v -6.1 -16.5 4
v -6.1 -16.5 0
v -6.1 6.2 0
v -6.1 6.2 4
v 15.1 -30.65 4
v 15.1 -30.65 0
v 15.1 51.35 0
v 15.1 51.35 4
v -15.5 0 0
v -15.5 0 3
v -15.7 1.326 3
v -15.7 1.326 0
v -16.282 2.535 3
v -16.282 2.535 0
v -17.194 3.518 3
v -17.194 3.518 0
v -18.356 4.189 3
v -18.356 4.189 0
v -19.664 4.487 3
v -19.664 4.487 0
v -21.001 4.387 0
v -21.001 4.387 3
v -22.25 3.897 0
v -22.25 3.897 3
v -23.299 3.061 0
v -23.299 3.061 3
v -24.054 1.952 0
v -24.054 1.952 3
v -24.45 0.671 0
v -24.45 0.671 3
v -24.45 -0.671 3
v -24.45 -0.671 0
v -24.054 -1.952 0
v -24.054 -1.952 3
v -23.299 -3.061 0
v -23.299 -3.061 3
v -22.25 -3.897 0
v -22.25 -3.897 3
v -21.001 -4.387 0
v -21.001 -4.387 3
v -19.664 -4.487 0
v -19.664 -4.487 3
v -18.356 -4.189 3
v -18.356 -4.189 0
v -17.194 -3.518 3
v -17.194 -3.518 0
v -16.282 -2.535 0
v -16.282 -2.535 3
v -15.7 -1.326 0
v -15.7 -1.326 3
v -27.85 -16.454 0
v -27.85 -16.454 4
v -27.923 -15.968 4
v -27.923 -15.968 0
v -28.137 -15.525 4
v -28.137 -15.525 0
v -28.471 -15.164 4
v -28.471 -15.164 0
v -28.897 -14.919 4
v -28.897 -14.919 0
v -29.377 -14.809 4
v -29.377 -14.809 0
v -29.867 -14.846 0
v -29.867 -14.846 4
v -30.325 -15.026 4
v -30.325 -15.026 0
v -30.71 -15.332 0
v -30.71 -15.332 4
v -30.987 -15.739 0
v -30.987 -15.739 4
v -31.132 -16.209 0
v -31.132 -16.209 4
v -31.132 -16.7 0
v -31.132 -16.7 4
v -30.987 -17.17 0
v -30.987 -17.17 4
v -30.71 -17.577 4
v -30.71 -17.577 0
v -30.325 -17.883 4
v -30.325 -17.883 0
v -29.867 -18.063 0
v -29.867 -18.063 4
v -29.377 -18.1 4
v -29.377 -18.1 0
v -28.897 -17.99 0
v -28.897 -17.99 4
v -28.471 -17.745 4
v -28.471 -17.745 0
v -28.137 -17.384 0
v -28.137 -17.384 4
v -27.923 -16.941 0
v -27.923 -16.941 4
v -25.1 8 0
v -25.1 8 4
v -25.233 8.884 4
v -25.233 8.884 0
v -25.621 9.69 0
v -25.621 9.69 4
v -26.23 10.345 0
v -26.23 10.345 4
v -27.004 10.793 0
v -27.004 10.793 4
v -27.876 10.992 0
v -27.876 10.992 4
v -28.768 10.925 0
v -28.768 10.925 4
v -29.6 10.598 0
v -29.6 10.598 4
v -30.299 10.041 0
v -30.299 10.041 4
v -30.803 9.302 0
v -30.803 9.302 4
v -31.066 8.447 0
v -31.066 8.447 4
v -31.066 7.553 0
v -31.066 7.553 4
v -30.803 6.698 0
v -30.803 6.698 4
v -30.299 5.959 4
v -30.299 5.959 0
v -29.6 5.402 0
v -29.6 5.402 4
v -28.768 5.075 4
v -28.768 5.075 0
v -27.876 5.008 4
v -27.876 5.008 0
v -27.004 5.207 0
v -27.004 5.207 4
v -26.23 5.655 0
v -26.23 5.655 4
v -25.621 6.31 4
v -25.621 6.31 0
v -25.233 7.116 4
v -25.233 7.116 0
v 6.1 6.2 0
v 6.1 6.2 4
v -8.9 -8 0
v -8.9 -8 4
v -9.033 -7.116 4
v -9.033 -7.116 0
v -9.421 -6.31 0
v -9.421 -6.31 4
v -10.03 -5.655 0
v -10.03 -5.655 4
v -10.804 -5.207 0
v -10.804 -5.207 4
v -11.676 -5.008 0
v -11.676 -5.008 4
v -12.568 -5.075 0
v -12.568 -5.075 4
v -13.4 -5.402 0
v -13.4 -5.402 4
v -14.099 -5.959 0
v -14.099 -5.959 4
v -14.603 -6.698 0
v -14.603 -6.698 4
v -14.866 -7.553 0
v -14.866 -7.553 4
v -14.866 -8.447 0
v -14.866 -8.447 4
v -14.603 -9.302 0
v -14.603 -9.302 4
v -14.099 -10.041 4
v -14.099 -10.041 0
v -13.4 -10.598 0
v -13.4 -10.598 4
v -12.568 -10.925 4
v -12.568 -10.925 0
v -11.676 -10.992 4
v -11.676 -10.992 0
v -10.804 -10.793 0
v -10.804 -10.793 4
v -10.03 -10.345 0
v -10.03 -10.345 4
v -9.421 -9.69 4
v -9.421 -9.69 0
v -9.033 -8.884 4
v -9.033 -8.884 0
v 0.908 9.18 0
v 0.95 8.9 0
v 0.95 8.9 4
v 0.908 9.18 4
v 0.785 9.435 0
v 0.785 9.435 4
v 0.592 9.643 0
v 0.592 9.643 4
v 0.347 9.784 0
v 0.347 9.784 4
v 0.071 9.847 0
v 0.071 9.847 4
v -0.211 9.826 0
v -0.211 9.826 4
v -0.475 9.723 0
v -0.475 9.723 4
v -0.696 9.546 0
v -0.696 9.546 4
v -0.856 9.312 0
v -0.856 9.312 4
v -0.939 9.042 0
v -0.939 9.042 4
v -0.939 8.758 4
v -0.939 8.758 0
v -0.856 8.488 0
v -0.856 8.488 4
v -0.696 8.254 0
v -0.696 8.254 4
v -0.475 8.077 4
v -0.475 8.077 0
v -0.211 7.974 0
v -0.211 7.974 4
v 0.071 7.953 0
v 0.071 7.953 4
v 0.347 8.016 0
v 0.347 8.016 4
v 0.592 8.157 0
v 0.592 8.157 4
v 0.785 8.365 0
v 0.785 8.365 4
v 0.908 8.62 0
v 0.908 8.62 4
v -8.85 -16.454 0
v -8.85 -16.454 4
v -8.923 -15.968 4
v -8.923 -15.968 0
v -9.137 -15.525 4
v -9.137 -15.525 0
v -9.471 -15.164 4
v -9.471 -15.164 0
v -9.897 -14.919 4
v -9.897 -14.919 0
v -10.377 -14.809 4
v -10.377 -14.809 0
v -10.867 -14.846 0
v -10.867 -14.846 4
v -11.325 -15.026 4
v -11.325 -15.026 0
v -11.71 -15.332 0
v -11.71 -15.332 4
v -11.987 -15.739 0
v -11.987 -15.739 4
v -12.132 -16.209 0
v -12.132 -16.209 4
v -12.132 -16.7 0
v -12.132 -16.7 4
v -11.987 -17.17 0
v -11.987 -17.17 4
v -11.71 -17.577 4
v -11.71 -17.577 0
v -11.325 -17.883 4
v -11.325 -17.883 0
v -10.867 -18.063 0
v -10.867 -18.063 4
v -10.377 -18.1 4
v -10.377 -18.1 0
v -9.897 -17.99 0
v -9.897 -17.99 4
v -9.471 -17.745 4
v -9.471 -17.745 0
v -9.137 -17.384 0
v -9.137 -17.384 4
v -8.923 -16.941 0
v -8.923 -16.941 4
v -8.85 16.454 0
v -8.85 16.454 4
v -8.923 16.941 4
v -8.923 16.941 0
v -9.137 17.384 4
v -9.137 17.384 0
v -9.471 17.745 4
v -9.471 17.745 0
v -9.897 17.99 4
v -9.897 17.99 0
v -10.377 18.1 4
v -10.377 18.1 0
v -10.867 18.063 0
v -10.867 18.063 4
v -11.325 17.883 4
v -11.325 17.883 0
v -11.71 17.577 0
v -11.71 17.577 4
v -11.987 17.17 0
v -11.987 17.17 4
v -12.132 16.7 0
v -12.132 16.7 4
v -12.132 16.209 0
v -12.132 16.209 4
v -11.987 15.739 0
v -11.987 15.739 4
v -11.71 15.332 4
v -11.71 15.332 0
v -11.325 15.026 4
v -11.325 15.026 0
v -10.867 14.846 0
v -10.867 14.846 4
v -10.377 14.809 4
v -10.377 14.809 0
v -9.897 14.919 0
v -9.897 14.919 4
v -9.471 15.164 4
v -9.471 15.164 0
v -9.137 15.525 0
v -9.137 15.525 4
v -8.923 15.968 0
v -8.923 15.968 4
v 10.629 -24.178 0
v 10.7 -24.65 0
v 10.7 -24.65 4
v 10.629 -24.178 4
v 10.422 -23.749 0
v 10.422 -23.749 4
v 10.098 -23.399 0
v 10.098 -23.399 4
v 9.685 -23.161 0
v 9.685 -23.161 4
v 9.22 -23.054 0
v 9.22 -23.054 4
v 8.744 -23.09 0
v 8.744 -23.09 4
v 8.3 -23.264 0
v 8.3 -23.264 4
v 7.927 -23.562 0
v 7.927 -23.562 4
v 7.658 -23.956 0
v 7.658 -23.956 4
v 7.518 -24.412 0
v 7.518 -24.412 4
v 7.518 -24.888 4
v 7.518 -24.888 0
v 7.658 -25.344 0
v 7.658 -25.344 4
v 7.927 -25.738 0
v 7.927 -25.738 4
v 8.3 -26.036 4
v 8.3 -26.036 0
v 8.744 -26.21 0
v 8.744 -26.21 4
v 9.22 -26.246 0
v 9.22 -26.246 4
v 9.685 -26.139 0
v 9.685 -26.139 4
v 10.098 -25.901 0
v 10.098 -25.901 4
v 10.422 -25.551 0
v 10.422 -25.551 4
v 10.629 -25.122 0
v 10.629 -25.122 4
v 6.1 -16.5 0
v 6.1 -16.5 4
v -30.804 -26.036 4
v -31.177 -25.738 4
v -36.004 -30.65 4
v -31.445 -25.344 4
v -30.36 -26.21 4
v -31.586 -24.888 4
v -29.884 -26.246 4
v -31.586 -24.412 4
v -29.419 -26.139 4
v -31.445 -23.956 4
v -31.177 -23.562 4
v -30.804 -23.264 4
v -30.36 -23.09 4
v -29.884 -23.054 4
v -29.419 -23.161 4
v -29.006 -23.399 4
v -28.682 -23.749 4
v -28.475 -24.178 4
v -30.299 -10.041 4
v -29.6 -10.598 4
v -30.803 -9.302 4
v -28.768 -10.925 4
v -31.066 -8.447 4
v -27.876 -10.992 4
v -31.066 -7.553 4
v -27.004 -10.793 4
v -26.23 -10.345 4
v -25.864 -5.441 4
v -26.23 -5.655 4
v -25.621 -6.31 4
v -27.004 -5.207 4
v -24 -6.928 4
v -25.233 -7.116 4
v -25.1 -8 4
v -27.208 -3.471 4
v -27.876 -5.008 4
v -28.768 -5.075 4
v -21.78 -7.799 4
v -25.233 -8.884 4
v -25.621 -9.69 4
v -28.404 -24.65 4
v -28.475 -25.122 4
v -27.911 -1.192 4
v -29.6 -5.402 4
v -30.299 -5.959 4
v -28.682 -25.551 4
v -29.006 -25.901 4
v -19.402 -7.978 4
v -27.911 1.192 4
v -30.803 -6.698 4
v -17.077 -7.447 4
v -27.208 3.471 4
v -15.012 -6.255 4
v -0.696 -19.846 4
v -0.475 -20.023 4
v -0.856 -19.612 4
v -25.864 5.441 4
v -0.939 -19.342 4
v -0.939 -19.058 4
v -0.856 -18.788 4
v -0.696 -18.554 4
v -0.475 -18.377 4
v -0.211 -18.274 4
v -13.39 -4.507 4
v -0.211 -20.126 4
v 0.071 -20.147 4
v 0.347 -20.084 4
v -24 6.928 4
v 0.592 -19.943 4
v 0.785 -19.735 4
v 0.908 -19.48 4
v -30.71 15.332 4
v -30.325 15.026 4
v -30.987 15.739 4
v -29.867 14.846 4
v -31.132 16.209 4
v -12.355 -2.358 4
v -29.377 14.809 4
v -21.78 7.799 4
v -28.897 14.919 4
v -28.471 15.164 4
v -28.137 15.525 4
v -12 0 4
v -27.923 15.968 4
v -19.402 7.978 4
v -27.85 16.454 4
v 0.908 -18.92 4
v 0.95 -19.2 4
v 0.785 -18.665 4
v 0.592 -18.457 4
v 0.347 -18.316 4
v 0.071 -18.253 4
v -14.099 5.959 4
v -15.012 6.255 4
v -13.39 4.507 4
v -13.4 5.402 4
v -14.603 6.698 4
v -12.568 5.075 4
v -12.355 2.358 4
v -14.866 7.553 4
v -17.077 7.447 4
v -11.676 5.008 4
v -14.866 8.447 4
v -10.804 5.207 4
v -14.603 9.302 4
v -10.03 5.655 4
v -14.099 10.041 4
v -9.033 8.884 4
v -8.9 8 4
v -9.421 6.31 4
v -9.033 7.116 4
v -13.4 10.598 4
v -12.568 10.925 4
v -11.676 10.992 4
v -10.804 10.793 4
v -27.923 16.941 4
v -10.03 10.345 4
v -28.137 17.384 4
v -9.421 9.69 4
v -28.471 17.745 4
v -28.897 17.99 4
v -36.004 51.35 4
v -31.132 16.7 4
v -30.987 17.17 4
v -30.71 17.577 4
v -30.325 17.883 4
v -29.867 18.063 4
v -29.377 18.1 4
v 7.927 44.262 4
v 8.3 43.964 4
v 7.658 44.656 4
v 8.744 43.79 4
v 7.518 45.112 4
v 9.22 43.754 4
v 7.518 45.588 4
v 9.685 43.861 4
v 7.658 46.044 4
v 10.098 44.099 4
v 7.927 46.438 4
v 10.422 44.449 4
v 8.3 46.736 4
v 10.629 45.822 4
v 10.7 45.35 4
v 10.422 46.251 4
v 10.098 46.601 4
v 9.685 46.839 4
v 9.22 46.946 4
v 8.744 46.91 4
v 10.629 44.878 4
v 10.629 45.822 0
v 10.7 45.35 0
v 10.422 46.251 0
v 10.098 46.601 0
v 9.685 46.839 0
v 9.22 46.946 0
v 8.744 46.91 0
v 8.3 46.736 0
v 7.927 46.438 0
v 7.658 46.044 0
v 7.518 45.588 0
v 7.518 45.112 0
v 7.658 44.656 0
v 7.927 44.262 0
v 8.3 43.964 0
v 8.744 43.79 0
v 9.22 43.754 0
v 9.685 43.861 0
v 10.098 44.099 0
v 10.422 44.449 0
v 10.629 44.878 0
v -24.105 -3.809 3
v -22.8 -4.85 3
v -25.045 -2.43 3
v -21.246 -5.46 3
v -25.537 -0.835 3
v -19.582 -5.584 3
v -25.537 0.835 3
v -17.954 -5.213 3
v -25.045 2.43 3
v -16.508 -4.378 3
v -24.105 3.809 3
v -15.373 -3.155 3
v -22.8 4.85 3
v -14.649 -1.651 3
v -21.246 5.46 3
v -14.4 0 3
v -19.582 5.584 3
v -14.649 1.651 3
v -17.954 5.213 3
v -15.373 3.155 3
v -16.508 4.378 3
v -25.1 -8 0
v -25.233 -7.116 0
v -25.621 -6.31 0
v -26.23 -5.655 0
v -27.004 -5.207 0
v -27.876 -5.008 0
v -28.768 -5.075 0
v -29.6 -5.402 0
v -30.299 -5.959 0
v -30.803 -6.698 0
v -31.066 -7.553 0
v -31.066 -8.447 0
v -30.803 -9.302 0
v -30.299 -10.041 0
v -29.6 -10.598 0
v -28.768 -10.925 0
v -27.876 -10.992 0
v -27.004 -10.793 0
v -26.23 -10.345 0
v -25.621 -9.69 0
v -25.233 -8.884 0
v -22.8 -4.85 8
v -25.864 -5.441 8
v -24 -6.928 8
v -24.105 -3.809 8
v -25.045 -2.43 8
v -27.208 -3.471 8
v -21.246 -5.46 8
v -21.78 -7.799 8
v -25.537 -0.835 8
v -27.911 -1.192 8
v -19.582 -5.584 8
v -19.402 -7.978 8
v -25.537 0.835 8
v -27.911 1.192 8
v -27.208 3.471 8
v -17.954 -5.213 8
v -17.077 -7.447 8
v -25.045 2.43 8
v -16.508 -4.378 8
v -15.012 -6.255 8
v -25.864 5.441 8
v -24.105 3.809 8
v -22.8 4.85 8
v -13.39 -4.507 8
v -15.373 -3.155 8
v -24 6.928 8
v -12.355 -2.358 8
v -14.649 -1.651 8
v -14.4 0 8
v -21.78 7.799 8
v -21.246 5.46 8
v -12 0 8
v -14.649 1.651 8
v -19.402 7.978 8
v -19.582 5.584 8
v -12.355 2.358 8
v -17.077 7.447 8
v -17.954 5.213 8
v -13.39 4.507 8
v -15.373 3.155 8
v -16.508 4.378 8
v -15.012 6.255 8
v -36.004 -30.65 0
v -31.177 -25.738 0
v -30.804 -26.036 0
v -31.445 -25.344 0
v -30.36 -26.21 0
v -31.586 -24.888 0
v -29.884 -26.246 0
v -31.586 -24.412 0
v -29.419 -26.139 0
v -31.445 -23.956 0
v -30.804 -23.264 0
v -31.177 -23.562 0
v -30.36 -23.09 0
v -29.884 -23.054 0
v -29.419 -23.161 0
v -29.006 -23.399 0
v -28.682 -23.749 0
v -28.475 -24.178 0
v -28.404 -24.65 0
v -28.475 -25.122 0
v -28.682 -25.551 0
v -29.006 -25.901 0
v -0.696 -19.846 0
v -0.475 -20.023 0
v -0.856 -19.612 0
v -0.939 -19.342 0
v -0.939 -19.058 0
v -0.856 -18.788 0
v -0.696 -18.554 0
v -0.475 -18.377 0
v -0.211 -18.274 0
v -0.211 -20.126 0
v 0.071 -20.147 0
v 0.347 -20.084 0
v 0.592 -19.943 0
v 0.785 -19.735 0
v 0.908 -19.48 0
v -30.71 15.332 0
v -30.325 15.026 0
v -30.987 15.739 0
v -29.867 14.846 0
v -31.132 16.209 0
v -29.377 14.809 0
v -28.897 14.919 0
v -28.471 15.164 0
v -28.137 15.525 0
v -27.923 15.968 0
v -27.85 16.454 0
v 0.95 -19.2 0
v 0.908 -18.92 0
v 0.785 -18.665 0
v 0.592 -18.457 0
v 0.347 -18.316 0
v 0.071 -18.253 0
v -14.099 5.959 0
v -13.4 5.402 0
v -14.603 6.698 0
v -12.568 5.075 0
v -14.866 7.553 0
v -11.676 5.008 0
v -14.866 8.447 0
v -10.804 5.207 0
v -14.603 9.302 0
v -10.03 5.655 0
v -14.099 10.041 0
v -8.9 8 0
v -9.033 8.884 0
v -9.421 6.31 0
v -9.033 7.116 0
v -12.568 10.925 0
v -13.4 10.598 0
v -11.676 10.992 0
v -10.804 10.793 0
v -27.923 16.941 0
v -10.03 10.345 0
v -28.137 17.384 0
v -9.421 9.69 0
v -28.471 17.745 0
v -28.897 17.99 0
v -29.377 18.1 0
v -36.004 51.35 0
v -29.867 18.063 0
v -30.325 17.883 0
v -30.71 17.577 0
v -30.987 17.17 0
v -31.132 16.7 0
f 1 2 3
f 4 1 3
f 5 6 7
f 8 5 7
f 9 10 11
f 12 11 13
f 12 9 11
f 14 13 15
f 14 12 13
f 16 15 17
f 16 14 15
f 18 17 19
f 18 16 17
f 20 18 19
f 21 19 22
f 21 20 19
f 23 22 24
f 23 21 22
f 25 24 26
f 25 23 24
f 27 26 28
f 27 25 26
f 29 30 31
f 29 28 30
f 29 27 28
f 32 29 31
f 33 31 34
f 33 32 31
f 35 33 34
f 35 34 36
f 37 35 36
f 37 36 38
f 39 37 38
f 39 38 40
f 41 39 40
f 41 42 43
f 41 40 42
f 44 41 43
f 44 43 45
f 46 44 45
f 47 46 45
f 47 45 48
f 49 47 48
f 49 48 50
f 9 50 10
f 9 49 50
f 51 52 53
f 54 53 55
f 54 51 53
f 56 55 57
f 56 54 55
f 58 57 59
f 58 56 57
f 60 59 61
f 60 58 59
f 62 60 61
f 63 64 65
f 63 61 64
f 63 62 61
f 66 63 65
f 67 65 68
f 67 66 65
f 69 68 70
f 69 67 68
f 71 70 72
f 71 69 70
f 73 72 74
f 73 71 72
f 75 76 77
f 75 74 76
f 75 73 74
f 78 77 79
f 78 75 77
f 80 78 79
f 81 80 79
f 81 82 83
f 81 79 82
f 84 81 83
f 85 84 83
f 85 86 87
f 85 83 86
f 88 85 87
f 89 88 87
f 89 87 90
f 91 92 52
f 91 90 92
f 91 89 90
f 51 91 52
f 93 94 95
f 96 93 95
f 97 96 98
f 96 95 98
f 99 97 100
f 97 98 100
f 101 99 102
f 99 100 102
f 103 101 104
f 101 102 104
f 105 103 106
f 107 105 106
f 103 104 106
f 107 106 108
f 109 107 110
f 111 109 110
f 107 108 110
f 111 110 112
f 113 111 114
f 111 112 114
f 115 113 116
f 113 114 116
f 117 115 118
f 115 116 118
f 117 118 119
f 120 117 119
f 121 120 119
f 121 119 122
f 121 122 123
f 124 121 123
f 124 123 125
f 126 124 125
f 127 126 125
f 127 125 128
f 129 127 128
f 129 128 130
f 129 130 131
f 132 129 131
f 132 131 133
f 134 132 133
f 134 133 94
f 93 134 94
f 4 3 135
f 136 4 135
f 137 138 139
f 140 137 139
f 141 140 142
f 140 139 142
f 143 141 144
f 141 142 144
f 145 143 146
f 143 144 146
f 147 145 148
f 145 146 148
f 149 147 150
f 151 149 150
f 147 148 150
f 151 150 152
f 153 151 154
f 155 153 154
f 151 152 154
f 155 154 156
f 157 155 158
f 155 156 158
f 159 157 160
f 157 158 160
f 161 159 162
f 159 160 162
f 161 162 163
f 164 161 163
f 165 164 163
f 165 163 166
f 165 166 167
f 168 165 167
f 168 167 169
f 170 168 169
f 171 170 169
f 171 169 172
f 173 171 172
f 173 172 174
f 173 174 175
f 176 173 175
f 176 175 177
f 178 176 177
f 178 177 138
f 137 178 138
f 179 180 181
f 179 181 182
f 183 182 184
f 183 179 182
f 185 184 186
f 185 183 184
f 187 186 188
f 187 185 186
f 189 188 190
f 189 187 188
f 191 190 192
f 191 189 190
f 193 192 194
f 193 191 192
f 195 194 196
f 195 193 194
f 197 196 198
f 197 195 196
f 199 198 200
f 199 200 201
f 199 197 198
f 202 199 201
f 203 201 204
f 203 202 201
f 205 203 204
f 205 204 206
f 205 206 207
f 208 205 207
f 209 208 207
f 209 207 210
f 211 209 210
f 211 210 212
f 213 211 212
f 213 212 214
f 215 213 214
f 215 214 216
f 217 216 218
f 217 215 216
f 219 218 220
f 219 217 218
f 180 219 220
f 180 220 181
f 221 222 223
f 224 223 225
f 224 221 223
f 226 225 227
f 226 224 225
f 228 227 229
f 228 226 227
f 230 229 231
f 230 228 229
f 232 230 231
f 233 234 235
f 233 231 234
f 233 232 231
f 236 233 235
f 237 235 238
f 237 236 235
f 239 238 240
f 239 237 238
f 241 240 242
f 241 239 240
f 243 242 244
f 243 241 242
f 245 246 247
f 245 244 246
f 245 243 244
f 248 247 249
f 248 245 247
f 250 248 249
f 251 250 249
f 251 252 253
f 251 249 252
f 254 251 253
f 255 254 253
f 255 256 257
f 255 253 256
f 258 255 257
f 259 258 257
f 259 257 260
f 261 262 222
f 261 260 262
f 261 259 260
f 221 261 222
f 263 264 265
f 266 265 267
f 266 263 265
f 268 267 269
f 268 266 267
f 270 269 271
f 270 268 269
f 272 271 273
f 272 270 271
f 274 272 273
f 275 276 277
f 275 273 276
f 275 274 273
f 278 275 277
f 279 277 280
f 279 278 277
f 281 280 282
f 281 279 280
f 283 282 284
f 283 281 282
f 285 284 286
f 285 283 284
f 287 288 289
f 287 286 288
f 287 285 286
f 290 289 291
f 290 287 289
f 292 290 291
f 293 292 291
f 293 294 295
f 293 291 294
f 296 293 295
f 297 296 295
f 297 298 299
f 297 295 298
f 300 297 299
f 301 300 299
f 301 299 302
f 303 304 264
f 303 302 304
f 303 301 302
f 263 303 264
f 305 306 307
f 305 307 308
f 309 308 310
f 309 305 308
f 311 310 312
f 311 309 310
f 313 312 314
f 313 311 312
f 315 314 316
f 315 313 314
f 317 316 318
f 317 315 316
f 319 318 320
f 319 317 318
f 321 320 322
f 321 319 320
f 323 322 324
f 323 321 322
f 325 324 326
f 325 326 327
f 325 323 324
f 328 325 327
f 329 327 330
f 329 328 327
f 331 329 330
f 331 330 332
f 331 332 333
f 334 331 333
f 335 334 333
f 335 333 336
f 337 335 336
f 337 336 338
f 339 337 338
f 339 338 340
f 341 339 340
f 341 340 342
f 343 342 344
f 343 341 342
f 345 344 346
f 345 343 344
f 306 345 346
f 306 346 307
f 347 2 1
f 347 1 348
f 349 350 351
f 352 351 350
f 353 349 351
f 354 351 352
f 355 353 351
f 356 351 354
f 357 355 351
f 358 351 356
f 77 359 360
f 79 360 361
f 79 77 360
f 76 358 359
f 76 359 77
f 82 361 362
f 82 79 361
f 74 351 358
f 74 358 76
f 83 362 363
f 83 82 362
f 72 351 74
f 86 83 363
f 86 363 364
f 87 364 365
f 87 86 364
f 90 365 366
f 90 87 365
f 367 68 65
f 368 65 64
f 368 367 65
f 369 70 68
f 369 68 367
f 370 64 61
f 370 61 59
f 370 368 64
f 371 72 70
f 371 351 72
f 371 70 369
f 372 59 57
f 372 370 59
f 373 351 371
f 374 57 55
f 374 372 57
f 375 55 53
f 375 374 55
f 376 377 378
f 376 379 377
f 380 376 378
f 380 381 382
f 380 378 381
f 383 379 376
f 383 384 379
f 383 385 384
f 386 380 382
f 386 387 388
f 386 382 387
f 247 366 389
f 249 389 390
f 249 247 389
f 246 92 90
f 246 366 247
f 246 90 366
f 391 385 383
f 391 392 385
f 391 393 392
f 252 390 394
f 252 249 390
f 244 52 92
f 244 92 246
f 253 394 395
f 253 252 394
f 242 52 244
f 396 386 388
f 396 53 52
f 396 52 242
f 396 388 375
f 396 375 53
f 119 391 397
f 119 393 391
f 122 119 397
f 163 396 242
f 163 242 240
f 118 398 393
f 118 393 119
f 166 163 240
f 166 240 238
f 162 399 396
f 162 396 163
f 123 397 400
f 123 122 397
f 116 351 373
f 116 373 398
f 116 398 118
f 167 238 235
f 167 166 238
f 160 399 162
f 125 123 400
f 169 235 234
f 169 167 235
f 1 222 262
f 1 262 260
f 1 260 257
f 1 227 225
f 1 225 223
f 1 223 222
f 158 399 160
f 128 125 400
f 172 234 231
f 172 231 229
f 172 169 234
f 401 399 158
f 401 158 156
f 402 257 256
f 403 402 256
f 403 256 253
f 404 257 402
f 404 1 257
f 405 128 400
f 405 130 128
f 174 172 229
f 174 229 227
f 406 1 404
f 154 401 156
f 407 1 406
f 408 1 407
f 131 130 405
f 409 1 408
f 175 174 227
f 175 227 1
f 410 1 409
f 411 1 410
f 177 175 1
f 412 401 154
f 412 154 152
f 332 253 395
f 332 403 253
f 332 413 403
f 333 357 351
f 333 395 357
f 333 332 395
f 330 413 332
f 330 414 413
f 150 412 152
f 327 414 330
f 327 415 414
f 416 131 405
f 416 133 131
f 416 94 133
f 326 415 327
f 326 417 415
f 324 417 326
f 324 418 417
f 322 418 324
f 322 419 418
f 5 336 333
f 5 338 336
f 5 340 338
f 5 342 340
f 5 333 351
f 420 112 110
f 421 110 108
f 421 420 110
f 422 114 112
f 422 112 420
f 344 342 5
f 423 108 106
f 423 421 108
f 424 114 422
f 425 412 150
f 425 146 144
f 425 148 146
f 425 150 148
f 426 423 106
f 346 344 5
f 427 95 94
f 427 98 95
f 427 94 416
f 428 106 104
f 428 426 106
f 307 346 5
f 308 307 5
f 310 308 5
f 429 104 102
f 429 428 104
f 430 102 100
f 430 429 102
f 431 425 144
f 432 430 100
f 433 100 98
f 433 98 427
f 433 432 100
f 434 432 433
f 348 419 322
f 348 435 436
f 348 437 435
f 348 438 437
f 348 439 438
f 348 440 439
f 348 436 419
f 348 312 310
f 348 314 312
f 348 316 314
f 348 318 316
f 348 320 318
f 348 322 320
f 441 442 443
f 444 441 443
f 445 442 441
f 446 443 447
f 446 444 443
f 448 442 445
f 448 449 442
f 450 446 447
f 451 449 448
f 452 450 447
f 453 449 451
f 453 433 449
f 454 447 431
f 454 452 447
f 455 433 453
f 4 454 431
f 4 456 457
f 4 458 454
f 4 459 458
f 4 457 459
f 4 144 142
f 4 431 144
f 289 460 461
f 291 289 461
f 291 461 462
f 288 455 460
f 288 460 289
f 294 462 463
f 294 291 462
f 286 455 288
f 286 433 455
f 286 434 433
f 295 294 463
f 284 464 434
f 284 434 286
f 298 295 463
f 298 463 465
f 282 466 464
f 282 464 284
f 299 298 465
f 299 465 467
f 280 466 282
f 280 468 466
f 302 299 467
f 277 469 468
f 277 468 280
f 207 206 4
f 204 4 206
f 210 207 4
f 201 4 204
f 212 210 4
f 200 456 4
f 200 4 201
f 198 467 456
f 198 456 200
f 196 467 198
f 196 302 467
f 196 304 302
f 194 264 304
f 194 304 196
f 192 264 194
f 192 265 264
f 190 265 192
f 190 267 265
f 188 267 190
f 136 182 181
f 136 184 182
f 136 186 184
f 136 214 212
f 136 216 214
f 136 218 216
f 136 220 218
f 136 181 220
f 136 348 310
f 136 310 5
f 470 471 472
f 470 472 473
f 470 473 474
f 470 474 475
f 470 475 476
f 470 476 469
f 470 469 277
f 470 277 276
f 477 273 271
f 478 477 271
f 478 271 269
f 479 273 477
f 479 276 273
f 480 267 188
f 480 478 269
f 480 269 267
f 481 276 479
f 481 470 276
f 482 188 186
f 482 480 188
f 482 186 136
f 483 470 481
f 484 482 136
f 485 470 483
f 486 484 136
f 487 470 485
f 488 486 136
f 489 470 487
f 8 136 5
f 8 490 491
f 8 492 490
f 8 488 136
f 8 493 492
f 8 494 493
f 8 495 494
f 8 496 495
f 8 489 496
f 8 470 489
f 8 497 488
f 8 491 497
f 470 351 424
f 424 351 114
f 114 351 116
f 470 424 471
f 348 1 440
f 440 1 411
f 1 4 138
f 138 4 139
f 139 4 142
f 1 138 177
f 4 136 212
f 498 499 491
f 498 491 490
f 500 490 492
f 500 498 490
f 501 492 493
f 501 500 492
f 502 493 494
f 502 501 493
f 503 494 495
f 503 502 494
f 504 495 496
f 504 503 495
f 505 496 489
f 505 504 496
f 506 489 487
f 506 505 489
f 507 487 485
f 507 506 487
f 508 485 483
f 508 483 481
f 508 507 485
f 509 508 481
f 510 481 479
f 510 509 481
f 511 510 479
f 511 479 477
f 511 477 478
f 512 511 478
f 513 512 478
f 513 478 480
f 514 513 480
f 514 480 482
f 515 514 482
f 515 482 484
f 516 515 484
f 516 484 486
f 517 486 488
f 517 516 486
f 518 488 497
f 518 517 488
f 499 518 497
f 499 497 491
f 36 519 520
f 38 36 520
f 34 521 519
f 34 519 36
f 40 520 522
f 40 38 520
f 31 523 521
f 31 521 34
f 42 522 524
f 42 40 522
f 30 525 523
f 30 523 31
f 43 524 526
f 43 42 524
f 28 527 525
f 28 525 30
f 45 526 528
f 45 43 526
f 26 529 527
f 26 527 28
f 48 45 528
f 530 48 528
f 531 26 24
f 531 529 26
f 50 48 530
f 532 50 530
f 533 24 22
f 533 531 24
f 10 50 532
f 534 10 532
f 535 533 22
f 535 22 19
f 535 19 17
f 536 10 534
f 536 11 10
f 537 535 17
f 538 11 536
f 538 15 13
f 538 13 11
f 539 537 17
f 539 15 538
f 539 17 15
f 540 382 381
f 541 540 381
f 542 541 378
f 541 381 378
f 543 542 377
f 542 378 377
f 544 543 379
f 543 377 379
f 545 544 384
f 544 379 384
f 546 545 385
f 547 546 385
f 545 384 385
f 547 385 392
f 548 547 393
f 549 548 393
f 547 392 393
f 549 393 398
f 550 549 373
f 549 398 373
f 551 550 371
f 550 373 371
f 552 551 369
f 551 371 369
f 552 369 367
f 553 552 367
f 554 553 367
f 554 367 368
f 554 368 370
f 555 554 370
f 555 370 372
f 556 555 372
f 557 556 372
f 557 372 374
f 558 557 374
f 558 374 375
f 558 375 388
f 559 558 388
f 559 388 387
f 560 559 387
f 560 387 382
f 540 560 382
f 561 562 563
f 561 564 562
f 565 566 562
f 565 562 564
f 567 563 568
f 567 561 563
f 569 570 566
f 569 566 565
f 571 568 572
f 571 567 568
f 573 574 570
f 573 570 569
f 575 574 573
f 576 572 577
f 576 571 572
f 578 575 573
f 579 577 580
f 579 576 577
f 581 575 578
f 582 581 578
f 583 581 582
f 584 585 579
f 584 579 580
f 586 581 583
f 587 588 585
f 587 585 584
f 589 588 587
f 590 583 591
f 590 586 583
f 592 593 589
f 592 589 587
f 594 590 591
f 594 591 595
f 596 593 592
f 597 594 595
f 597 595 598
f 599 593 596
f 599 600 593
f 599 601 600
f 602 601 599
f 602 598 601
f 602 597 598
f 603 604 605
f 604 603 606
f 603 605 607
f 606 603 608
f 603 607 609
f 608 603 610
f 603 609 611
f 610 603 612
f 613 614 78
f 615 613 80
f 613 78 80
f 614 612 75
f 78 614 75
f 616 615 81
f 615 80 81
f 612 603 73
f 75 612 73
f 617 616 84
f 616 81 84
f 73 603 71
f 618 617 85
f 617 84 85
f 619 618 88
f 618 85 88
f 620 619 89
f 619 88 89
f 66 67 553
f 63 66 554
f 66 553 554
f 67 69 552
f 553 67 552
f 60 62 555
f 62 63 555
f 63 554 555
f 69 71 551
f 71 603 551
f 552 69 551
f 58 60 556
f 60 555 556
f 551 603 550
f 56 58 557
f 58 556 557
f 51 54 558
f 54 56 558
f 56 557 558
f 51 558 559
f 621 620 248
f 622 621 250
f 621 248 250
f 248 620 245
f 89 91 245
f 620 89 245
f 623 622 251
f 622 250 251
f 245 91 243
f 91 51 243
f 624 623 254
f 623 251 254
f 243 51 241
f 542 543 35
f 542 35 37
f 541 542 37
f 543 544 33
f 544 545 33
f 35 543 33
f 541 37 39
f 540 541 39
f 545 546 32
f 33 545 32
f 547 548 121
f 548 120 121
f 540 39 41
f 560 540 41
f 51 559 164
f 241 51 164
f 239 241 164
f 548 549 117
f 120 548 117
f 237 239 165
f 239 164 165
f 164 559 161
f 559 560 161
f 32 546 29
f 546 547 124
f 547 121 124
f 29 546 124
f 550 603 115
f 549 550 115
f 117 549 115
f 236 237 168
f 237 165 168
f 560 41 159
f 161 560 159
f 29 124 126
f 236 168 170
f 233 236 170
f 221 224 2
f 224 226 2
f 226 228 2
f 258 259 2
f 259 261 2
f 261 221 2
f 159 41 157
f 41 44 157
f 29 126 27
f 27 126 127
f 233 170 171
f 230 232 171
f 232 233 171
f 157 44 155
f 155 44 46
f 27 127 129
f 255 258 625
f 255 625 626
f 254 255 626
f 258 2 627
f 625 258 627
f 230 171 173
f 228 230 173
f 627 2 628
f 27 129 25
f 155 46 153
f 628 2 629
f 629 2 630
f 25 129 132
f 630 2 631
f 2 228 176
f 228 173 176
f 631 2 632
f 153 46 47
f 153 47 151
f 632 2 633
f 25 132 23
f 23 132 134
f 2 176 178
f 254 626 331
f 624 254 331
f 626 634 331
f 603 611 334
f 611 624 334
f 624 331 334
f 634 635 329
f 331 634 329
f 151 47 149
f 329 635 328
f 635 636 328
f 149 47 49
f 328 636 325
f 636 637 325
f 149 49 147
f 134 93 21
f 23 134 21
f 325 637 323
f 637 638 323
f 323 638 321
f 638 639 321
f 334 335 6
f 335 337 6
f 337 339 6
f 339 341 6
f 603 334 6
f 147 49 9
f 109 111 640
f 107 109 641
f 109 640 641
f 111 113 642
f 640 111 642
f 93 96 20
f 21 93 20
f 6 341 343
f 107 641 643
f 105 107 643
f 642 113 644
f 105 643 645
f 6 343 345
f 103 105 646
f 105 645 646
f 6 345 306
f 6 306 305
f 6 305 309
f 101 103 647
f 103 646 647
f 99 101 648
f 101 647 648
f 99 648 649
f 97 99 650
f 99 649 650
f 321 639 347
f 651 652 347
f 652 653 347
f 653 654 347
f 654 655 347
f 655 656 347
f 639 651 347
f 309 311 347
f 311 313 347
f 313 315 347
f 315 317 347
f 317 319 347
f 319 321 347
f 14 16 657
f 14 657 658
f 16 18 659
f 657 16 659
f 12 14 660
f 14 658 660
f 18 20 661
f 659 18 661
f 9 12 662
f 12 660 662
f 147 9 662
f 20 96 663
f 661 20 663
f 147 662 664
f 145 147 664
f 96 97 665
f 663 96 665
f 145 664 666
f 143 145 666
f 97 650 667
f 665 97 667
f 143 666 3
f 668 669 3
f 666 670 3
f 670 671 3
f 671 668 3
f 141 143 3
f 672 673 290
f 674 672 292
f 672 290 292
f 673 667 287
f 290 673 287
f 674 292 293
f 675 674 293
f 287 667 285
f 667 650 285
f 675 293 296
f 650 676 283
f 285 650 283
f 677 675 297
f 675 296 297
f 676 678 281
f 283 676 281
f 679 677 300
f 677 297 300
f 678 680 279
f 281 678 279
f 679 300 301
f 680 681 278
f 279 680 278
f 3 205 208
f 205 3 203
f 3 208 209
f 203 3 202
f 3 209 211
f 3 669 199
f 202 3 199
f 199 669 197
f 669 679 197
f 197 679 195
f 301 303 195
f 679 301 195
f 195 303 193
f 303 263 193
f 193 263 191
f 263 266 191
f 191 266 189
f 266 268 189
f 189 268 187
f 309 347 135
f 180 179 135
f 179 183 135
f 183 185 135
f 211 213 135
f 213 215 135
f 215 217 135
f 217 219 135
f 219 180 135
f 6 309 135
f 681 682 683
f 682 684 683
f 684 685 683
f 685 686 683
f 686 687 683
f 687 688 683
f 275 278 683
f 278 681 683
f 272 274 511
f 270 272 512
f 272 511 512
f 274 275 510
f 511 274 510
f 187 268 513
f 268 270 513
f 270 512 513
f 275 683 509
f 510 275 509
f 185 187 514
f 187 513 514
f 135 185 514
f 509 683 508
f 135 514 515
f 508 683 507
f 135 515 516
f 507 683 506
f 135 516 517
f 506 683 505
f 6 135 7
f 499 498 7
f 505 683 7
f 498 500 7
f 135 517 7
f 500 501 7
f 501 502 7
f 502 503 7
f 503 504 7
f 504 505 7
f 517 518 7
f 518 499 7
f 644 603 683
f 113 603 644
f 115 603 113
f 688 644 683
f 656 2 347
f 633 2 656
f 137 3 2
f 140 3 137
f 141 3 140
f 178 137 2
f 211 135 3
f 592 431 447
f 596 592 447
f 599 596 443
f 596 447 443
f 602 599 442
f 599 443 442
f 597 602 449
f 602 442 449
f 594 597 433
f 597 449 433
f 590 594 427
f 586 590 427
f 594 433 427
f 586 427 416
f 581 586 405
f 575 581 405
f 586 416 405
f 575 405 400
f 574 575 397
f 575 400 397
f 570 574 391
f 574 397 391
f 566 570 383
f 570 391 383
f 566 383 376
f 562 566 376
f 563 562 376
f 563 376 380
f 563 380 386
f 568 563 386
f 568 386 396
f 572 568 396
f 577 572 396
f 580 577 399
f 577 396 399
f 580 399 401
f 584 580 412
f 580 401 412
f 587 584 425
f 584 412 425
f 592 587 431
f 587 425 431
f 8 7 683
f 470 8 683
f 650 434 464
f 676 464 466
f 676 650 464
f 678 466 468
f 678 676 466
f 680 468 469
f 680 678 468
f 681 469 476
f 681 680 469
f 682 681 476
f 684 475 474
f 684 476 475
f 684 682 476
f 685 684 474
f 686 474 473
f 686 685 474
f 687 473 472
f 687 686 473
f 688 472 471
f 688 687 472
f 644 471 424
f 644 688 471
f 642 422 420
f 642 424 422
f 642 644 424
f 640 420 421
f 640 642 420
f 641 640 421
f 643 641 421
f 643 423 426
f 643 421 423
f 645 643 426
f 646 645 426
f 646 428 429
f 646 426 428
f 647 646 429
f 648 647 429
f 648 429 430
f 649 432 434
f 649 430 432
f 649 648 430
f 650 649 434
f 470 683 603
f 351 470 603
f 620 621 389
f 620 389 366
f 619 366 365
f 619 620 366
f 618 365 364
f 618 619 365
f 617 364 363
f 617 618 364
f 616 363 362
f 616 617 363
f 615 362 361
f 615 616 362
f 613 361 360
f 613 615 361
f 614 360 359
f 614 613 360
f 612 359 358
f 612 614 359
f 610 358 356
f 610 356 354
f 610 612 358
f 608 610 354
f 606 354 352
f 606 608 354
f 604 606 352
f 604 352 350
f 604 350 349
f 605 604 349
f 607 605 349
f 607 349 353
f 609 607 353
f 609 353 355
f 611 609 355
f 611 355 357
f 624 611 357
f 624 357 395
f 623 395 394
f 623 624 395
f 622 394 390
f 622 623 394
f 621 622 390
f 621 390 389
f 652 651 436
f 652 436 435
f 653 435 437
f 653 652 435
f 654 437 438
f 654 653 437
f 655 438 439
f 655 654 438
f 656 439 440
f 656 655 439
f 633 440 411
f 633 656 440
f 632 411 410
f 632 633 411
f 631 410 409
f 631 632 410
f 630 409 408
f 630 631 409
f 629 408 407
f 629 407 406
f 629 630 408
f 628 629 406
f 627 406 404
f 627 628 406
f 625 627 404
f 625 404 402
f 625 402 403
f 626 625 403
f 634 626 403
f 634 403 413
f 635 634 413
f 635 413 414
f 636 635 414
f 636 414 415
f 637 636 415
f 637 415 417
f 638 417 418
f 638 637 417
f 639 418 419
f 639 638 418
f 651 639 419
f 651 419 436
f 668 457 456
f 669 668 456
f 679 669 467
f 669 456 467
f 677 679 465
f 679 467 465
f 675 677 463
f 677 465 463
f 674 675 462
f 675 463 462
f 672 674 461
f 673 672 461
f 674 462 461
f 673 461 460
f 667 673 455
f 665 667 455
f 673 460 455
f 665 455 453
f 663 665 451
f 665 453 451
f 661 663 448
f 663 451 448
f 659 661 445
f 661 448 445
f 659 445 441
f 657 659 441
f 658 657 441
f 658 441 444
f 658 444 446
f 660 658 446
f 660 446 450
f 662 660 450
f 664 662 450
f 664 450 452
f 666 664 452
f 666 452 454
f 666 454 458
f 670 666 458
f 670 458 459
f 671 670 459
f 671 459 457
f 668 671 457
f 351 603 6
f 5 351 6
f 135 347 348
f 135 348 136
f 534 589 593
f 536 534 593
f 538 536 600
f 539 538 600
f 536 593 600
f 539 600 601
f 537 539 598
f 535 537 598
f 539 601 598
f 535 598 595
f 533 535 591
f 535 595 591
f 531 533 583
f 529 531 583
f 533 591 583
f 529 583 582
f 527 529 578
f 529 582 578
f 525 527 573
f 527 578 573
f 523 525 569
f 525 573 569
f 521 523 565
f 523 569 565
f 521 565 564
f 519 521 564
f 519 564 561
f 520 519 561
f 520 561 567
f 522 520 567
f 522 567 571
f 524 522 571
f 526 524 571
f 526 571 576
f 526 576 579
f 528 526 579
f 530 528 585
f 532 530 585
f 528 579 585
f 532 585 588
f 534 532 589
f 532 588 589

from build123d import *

# Parameters (mm, degrees)
SKETCH1_W               = 39.1
SKETCH1_H               = 33
SKETCH1_R               = 0.95
SKETCH1_R_2             = 4.5
SKETCH1_W_2             = 12.2
SKETCH1_H_2             = 22.7
BOSS_EXTRUDE1_DEPTH     = 4
BOSS_EXTRUDE2_START     = 4
SKETCH2_R               = 8
SKETCH2_R_2             = 4.403773093
BOSS_EXTRUDE2_DEPTH     = 4
CUT_EXTRUDE1_START      = 8
SKETCH3_R               = 5.6
CUT_EXTRUDE1_DEPTH      = 5
SKETCH5_W               = 39.1
SKETCH5_H               = 10
SKETCH5_W_2             = 6.003695208
SKETCH5_H_2             = 43
BOSS_EXTRUDE3_DEPTH     = 4
SKETCH4_R               = 1.65
CUT_EXTRUDE3_DEPTH      = 9
CUT_EXTRUDE3_DEPTH_BACK = 10
CUT_EXTRUDE4_START      = 4
SKETCH6_R               = 3
CUT_EXTRUDE4_DEPTH      = 10
SKETCH7_W               = 6
SKETCH7_H               = 43
BOSS_EXTRUDE4_DEPTH     = 4
SKETCH8_R               = 1.6
CUT_EXTRUDE6_DEPTH      = 4


with BuildPart() as part:
    # Sketch1 → Boss-Extrude1 (new body)
    with BuildSketch(Plane.XY):
        with Locations((-10.45, -5.15)):
            Rectangle(SKETCH1_W, SKETCH1_H)
        with Locations((0, 8.9)):
            Circle(SKETCH1_R, mode=Mode.SUBTRACT)
        with Locations((0, -19.2)):
            Circle(SKETCH1_R, mode=Mode.SUBTRACT)
        with Locations((-20, 0)):
            Circle(SKETCH1_R_2, mode=Mode.SUBTRACT)
        with Locations((0, -5.15)):
            Rectangle(SKETCH1_W_2, SKETCH1_H_2, mode=Mode.SUBTRACT)
    extrude(amount=BOSS_EXTRUDE1_DEPTH)

    # Sketch2 → Boss-Extrude2 (add)
    with BuildSketch(Plane.XY.offset(BOSS_EXTRUDE2_START)):
        with Locations((-20, 0)):
            Circle(SKETCH2_R)
        with Locations((-20, 0)):
            Circle(SKETCH2_R_2, mode=Mode.SUBTRACT)
    extrude(amount=BOSS_EXTRUDE2_DEPTH)

    # Sketch3 → Cut-Extrude1 (cut)
    with BuildSketch(Plane.XY.offset(CUT_EXTRUDE1_START)):
        with Locations((-20, 0)):
            Circle(SKETCH3_R)
    extrude(amount=-CUT_EXTRUDE1_DEPTH, mode=Mode.SUBTRACT)

    # Sketch5 → Boss-Extrude3 (add)
    with BuildSketch(Plane.XY):
        with Locations((-10.45, 16.35)):
            Rectangle(SKETCH5_W, SKETCH5_H)
        with Locations((-33.001847604, -0.15)):
            Rectangle(SKETCH5_W_2, SKETCH5_H_2)
    extrude(amount=BOSS_EXTRUDE3_DEPTH)

    # Sketch4 → Cut-Extrude3 (cut, two sides)
    with BuildSketch(Plane.XY) as cut_extrude3_sk:
        with Locations((-10.5, 16.454482672)):
            Circle(SKETCH4_R)
        with Locations((-29.5, 16.454482672)):
            Circle(SKETCH4_R)
        with Locations((-29.5, -16.454482672)):
            Circle(SKETCH4_R)
        with Locations((-10.5, -16.454482672)):
            Circle(SKETCH4_R)
    extrude(amount=CUT_EXTRUDE3_DEPTH, mode=Mode.SUBTRACT)
    extrude(cut_extrude3_sk.sketch, amount=-CUT_EXTRUDE3_DEPTH_BACK, mode=Mode.SUBTRACT)

    # Sketch6 → Cut-Extrude4 (cut)
    with BuildSketch(Plane.XY.offset(CUT_EXTRUDE4_START)):
        with Locations((-11.9, 8)):
            Circle(SKETCH6_R)
        with Locations((-28.1, 8)):
            Circle(SKETCH6_R)
        with Locations((-11.9, -8)):
            Circle(SKETCH6_R)
        with Locations((-28.1, -8)):
            Circle(SKETCH6_R)
    extrude(amount=-CUT_EXTRUDE4_DEPTH, mode=Mode.SUBTRACT)

    # Sketch7 → Boss-Extrude4 (add)
    with BuildSketch(Plane.XY):
        Polygon((9.1, -21.65), (-36.003695208, -21.65), (-36.003695208, -30.65), (15.1, -30.65), (15.1, -21.65), align=None)
        with Locations((12.1, -0.15)):
            Rectangle(SKETCH7_W, SKETCH7_H)
        Polygon((-36.003695208, 21.35), (9.1, 21.35), (15.1, 21.35), (15.1, 51.35), (-36.003695208, 51.35), align=None)
    extrude(amount=BOSS_EXTRUDE4_DEPTH)

    # Sketch8 → Cut-Extrude6 (cut)
    with BuildSketch(Plane.XY):
        with Locations((9.1, -24.65)):
            Circle(SKETCH8_R)
        with Locations((-30.003695208, -24.65)):
            Circle(SKETCH8_R)
        with Locations((9.1, 45.35)):
            Circle(SKETCH8_R)
    extrude(amount=CUT_EXTRUDE6_DEPTH, mode=Mode.SUBTRACT)


solid = part.part
